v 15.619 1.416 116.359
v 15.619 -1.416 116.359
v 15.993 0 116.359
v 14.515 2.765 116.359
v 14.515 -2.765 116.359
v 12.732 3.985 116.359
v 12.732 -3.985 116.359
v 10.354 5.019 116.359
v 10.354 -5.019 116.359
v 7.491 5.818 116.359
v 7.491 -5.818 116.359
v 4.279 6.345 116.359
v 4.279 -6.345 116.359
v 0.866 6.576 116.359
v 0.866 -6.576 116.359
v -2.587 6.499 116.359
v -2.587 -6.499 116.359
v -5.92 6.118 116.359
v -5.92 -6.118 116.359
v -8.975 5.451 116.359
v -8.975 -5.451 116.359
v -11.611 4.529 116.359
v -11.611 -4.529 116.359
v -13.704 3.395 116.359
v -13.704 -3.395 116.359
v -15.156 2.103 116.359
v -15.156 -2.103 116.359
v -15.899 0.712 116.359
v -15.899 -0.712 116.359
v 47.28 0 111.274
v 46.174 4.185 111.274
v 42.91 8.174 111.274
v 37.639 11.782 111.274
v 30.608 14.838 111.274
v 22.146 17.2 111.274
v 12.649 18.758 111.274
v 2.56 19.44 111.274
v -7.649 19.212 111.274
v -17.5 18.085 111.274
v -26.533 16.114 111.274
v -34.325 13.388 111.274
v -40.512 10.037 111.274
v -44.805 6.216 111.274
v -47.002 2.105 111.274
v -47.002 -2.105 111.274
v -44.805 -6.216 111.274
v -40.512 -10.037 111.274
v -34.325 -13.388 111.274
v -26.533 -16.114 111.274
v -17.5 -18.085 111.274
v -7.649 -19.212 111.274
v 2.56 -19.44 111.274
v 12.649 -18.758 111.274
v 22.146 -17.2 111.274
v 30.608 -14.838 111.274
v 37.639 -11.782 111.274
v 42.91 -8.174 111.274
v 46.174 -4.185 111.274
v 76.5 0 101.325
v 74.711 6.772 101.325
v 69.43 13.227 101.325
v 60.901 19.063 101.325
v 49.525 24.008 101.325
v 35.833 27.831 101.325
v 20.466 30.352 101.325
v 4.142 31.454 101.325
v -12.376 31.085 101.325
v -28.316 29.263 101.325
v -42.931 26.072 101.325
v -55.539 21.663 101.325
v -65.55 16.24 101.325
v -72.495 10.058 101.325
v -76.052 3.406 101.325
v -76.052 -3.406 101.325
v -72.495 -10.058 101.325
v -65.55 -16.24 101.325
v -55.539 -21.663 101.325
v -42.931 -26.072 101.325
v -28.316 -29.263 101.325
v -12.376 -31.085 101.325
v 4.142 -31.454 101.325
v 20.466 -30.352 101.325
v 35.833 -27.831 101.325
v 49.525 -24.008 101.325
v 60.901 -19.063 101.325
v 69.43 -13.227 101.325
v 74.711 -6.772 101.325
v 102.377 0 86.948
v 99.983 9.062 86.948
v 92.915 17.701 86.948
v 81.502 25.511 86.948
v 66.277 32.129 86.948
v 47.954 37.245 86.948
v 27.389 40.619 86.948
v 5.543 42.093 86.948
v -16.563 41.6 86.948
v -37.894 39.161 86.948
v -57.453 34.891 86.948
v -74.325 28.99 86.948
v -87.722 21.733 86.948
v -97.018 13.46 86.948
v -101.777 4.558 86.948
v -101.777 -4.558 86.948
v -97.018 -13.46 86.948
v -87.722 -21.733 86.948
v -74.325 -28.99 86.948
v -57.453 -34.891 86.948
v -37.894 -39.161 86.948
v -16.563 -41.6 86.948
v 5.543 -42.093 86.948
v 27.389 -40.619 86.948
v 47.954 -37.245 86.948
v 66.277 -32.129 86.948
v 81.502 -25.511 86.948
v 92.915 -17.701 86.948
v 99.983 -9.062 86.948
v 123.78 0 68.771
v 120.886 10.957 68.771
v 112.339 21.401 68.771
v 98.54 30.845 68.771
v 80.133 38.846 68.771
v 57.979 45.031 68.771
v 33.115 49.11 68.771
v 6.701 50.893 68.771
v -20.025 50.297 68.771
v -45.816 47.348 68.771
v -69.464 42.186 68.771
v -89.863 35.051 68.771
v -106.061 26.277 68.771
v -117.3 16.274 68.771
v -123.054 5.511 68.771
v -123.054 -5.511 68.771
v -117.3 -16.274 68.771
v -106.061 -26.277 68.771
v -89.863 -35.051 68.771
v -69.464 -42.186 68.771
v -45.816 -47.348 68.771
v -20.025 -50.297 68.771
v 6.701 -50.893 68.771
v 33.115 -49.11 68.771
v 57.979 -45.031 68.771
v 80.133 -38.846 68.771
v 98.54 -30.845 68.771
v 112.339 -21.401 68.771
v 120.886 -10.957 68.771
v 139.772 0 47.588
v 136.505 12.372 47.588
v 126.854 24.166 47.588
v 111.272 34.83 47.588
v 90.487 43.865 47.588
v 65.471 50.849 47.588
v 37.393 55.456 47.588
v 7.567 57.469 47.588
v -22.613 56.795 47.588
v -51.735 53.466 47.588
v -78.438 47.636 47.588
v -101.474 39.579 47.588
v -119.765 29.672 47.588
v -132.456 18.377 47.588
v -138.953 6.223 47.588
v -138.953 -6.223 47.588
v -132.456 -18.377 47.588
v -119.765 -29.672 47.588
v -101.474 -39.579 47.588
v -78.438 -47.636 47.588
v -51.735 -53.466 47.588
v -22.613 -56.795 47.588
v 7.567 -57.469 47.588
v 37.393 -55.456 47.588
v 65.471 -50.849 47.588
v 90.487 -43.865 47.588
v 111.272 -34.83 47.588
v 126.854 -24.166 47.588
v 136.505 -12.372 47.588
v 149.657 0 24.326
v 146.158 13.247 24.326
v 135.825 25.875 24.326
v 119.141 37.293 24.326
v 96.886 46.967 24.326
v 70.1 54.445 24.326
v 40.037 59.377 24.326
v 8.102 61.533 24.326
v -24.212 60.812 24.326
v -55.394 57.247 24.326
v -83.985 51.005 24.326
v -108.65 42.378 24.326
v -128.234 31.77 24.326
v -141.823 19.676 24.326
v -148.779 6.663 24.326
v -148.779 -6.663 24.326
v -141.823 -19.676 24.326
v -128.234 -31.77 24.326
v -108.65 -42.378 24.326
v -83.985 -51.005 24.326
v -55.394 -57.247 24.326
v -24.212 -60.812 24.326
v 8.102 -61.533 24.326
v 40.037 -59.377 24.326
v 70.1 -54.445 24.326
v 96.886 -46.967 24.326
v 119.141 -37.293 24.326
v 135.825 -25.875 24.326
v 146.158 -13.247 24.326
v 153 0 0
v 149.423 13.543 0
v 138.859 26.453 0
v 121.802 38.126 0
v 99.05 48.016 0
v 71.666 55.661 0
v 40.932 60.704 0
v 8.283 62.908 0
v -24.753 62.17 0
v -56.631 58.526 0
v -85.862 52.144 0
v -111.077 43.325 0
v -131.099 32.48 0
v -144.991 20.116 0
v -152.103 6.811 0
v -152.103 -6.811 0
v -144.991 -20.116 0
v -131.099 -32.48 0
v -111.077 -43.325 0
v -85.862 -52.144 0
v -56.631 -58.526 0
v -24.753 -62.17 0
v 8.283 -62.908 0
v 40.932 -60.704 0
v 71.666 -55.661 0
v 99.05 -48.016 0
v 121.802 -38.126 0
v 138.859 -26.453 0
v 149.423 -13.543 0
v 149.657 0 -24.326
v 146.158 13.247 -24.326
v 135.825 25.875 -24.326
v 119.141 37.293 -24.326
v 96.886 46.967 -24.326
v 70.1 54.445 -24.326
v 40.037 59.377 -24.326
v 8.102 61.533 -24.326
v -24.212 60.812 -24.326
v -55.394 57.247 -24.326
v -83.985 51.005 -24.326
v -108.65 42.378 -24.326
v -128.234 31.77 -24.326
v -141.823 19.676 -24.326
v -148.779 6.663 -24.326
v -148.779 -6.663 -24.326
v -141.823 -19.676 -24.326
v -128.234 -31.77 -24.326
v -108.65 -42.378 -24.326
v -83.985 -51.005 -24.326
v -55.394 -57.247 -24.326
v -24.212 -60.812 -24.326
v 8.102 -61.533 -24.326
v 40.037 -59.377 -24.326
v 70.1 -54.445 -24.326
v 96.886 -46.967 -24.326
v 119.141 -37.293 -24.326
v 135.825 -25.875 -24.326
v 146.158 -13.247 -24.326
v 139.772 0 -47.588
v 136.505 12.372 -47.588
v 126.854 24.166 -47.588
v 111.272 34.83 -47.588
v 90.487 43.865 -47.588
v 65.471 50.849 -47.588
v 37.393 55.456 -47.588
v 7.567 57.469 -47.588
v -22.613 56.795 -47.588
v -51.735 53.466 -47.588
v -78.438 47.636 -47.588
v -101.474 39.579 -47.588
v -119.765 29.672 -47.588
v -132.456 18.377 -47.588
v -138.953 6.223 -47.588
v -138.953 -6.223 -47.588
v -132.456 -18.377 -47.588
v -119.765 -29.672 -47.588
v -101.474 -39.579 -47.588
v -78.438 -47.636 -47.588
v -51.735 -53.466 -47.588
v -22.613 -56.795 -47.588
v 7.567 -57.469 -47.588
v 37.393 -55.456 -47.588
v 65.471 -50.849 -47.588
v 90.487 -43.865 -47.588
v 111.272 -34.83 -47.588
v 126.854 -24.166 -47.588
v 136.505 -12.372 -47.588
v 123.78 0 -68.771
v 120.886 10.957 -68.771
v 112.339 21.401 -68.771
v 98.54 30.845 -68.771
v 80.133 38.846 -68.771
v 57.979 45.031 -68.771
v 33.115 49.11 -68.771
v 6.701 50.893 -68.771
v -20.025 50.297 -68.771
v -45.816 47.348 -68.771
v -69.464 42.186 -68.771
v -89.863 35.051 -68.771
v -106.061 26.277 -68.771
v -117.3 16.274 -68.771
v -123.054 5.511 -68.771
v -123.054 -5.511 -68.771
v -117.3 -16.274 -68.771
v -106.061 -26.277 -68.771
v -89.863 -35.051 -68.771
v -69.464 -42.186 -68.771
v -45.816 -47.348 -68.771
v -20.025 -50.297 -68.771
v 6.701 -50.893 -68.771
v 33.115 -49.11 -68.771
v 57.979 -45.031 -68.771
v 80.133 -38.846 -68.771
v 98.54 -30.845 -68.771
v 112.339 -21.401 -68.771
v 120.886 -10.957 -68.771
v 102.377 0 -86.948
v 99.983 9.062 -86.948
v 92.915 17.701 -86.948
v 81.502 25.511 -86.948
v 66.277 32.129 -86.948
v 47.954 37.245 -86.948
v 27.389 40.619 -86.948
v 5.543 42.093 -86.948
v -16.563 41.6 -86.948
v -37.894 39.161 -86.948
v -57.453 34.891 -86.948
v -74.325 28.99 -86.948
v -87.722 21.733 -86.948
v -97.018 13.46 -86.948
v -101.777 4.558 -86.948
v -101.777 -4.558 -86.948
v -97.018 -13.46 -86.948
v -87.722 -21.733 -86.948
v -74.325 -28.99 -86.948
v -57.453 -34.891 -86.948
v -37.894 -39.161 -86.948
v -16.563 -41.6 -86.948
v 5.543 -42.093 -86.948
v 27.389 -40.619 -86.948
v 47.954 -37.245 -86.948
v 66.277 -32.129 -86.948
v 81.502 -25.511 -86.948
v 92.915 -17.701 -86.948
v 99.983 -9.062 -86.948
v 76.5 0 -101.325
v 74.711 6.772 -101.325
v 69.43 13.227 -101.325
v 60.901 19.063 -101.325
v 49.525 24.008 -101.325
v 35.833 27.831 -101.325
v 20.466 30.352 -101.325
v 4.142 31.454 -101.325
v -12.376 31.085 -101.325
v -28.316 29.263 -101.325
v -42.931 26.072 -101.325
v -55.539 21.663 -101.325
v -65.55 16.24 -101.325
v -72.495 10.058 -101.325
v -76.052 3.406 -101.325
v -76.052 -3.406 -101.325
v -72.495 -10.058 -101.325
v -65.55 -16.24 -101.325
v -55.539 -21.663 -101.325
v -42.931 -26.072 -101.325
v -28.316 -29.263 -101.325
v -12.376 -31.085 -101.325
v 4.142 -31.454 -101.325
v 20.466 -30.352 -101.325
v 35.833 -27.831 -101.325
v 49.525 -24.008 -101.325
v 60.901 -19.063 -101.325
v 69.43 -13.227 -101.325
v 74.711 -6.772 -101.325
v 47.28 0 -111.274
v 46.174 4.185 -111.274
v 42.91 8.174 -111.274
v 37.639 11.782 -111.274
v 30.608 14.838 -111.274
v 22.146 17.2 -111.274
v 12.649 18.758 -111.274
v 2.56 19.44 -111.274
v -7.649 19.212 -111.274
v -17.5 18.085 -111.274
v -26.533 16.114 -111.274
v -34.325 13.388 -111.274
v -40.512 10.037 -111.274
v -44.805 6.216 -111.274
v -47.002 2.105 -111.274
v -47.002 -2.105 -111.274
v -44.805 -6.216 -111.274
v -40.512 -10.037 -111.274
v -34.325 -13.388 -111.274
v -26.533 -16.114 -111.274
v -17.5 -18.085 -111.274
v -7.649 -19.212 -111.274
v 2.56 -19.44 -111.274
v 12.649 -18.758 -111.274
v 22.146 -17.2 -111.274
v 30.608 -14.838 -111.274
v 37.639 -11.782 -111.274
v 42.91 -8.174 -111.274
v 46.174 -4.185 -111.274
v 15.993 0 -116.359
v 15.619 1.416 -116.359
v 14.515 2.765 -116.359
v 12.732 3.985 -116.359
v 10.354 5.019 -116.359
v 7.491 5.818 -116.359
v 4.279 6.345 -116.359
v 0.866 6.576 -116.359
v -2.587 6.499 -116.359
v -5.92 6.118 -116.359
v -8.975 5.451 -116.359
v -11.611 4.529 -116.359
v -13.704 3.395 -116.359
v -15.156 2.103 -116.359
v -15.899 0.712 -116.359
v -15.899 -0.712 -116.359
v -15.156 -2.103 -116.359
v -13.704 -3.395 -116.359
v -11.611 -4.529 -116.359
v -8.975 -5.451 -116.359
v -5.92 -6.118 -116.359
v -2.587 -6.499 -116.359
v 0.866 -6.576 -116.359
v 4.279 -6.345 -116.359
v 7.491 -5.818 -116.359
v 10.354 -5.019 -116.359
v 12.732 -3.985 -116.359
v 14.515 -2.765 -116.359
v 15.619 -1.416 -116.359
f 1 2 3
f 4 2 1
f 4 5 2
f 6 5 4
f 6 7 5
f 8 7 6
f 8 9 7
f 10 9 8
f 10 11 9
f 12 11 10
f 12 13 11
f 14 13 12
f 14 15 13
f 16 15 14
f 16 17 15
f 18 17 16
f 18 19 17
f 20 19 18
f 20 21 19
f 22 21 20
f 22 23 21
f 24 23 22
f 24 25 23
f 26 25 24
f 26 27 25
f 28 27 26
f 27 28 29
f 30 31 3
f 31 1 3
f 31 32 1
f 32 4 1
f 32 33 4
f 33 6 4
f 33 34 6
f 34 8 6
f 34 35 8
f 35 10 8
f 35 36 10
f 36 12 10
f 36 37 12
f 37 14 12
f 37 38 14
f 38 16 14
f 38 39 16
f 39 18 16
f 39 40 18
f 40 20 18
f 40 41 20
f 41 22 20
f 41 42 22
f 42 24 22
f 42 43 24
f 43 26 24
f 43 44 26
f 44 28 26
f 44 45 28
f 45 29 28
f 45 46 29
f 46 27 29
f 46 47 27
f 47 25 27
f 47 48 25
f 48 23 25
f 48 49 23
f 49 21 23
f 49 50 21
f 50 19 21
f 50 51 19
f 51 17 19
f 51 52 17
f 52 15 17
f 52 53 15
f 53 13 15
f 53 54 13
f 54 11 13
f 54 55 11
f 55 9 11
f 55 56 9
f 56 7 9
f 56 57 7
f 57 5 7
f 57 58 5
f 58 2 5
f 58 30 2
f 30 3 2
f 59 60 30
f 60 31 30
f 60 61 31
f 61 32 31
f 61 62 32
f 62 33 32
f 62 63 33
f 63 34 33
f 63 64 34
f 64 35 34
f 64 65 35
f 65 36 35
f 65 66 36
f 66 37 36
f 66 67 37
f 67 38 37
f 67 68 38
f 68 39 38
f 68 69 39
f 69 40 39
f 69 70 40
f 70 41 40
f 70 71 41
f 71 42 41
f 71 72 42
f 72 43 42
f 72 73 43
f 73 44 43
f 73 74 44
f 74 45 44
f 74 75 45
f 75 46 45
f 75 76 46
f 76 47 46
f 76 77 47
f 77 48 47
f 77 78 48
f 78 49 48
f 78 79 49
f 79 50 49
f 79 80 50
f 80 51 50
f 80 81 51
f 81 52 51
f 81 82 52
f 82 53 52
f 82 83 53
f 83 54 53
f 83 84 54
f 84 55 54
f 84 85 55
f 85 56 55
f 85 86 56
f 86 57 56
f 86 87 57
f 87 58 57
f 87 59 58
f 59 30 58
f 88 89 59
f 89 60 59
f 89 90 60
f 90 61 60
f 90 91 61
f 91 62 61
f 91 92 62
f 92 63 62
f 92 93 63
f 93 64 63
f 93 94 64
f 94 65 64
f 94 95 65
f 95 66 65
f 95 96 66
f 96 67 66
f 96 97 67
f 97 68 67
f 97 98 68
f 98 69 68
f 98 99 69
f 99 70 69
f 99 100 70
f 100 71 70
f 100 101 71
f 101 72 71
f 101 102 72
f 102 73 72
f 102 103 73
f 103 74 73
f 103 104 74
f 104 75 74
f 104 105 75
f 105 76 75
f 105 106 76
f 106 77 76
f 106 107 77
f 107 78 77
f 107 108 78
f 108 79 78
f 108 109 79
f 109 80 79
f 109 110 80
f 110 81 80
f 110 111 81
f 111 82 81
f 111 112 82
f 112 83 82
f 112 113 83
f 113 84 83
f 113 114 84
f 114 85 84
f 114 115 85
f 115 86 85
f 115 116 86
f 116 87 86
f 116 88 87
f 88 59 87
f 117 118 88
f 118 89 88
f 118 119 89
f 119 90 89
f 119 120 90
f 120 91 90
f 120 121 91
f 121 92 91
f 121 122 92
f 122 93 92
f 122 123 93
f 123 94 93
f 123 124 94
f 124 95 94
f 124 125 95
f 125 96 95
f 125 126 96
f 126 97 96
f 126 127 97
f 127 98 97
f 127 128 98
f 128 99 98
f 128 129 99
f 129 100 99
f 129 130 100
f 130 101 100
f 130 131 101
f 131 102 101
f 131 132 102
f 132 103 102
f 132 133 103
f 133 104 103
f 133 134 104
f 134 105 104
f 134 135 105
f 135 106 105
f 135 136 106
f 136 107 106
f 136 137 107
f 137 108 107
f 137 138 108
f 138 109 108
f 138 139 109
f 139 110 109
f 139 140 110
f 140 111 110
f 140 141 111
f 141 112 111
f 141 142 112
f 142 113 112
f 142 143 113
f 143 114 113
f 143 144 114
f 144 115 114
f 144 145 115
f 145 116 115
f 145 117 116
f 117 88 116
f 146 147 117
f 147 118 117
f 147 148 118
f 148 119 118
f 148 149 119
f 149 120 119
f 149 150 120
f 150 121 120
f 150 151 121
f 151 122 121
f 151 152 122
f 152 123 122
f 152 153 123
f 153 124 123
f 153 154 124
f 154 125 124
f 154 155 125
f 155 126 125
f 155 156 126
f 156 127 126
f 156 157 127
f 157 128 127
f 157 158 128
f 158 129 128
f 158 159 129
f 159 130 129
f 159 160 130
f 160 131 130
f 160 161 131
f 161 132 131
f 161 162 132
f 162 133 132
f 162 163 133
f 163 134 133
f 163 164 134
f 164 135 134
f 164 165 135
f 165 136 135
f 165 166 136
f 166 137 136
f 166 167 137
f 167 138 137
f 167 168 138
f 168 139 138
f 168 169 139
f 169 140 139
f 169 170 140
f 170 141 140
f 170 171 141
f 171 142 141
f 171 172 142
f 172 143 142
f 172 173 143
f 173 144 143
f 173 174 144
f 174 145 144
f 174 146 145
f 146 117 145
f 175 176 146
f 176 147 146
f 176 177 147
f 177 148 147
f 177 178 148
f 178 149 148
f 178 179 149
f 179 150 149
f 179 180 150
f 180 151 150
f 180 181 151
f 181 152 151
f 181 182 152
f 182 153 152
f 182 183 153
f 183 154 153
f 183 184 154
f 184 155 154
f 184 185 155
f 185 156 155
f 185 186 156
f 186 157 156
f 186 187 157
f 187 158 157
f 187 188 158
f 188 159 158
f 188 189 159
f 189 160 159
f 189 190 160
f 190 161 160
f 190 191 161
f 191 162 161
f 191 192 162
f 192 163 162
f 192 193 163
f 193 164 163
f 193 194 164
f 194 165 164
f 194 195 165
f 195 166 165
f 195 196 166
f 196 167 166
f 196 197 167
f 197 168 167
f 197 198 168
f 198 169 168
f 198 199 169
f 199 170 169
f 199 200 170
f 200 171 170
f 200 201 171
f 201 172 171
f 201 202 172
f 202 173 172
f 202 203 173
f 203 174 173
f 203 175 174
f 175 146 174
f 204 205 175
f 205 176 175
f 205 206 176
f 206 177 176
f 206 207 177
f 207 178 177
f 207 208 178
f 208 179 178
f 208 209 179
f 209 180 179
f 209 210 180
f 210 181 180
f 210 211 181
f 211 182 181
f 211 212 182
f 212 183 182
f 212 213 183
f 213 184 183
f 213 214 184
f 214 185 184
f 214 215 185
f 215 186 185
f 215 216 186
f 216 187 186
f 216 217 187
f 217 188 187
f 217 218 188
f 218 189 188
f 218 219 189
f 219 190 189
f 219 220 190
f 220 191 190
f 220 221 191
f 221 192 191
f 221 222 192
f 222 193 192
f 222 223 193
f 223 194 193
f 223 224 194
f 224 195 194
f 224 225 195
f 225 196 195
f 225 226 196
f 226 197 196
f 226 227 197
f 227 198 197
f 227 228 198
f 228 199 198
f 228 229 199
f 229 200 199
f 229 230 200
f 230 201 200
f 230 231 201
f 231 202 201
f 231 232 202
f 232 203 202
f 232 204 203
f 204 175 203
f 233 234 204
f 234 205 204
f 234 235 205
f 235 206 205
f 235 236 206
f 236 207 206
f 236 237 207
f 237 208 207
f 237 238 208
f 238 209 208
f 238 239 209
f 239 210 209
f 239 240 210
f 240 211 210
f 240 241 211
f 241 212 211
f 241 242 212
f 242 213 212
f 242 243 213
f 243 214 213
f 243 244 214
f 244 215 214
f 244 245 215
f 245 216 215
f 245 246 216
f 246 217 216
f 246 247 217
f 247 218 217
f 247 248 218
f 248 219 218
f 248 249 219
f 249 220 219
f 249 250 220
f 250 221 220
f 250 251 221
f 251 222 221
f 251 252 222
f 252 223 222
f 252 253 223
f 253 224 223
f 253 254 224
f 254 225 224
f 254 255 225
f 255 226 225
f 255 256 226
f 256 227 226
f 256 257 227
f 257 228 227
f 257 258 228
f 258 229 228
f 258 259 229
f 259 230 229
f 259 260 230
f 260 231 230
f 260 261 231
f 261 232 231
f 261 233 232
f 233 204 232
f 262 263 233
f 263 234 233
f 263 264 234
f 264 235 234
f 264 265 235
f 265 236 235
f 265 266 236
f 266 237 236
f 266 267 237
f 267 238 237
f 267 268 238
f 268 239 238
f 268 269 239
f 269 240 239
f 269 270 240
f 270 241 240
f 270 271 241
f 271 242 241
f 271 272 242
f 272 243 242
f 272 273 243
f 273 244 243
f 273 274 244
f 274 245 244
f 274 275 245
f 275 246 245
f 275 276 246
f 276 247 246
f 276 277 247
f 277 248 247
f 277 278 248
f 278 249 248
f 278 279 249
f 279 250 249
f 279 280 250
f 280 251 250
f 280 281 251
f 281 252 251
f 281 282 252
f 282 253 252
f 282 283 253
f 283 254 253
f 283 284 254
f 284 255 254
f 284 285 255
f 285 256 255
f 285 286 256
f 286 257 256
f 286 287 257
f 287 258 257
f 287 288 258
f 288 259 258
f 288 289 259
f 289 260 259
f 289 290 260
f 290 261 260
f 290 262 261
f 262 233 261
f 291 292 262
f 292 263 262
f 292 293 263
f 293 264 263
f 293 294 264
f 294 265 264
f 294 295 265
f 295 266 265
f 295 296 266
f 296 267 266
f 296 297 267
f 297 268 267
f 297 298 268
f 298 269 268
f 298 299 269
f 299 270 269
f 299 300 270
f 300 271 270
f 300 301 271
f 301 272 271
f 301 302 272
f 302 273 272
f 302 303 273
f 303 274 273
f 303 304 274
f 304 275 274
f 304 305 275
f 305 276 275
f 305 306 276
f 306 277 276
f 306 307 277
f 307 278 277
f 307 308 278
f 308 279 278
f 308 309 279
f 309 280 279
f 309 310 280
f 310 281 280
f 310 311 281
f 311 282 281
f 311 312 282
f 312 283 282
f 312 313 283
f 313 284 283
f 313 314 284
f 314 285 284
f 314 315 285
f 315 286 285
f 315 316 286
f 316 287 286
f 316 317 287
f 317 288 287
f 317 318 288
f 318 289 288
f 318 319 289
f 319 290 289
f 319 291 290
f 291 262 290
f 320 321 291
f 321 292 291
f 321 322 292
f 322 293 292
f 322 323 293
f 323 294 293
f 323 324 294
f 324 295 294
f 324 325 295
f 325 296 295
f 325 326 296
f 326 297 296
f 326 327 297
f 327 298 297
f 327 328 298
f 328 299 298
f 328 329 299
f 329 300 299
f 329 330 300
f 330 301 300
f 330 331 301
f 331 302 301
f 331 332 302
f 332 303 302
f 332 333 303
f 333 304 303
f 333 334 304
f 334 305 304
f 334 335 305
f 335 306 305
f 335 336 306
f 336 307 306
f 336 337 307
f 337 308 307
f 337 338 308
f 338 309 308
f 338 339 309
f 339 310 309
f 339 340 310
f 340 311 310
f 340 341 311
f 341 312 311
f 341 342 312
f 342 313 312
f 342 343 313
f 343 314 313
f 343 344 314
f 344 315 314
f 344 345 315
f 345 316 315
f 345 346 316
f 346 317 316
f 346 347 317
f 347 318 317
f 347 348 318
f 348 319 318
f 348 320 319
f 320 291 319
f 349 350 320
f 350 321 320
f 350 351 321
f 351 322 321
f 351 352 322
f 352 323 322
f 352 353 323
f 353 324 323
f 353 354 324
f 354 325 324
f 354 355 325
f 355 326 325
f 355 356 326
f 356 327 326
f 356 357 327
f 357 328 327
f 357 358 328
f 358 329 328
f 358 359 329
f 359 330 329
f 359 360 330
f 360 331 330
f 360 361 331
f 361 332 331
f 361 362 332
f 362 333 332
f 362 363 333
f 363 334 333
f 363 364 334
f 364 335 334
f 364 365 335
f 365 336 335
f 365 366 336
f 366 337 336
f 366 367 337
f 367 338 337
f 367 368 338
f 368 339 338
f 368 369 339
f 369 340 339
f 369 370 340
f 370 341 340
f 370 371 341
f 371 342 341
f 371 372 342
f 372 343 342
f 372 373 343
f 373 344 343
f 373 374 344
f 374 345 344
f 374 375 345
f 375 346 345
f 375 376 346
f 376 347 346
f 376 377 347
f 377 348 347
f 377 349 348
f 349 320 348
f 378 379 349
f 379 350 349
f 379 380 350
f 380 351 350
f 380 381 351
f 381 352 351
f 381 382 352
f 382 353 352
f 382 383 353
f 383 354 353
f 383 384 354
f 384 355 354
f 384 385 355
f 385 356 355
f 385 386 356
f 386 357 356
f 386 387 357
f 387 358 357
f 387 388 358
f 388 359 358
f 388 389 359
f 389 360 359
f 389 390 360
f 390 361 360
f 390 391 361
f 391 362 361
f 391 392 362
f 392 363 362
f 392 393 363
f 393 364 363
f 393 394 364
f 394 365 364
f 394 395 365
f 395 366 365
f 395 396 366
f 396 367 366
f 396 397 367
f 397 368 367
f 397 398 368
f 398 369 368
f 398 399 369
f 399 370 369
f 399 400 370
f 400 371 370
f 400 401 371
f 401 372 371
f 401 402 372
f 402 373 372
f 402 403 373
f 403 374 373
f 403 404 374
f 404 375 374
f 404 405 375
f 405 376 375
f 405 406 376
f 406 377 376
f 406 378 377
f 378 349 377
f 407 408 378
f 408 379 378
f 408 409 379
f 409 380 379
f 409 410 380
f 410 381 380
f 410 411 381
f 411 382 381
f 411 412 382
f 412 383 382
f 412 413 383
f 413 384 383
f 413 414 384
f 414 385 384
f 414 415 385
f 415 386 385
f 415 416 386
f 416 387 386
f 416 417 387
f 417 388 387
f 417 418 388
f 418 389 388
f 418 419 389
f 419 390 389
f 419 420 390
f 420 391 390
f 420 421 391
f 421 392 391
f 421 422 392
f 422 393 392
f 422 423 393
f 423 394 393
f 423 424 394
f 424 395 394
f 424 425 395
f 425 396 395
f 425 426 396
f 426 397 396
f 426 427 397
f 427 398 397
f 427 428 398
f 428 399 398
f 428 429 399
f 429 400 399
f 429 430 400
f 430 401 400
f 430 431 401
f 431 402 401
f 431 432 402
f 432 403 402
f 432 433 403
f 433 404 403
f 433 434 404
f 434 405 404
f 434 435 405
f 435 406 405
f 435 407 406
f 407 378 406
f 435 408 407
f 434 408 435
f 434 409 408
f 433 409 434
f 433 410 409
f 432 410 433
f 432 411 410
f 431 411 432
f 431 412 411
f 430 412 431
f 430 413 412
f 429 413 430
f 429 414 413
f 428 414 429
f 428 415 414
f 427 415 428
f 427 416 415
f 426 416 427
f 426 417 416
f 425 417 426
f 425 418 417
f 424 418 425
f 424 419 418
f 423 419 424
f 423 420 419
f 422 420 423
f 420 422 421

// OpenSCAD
// Generated by SolidPython 1.0.1 on 2020-07-29 00:46:52


scale(v = [17, 7, 13]) {
	sphere(r = 9);
}
/***********************************************
*********      SolidPython code:      **********
************************************************
 
# import packages: SolidPython
from solid import *
from solid.utils import *
from itertools import chain, combinations, permutations


class Resize:

    def __init__(self, scad_file):
        self.scad_file = scad_file
        #self.scad_file = import_scad(scad_file)
        # cone/cylinder param:
        self.r1 = 0
        self.r2 = 0
        self.h = 0
        # rectangular prism param:
        self.w = 0
        self.l = 0
        # ellipse param:
        self.r = 0

    # import OpenScad code (file name corresponds to shape)


    # classify shape + parameters
    def assign(self, param1, param2, param3):
        if self.scad_file == 'cone.scad':
            self.r1 = param1
            self.r2 = param2
            self.h = param3
        elif self.scad_file == 'cylinder.scad':
            self.r1 = param1
            self.r2 = param2
            self.h = param3
        elif self.scad_file == 'rectangularPrism.scad':
            self.h = param1
            self.l = param2
            self.w = param3
        else:
            self.r = param1
            self.h = param2

    # resize parameters
    def iterate(self):
        x = range(3, 20, 2)
        i = 1
        if self.scad_file == 'cone.scad':
            tempList = list(permutations(x, 2))
            for temp in tempList:
                param1 = temp[0]
                param2 = temp[1]
                filepath = 'produced_scad_files/' + 'cone' + str(param1) + '_' + str(param2) + '_' + '.scad'
                scad_render_to_file(cylinder(h=param1, r1=param2, r2=0), filepath)

        elif self.scad_file == 'cylinder.scad':
            tempList = list(permutations(x, 3))
            for temp in tempList:
                param1 = temp[0]
                param2 = temp[1]
                filepath = 'produced_scad_files/' + 'cylinder' + str(param1) + '_' + str(param2) + '_' + '.scad'
                scad_render_to_file(cylinder(h=param1, r1=param2, r2=param2), filepath)

        elif self.scad_file == 'rectangularPrism.scad':
            tempList = list(permutations(x, 3))
            for temp in tempList:
                param1 = temp[0]
                param2 = temp[1]
                param3 = temp[2]
                filepath = 'produced_scad_files/' + 'rectangularPrism' + str(param1) + '_' + str(param2) + '_' + str(
                    param3) + '.scad'
                scad_render_to_file(cube(size=(param1, param2, param3)), filepath)

        elif self.scad_file == 'ellipse.scad':
            tempList = list(permutations(x, 4))
            for temp in tempList:
                param1 = temp[0]
                param2 = temp[1]
                param3 = temp[2]
                param4 = temp[3]
                filepath = 'produced_scad_files/' + 'ellipse' + str(param1) + '_' + str(param2) + '_' + str(param3) + '_' + str(param4) + '.scad'
                scad_render_to_file(scale([param1, param2, param3])(sphere(r=param4)), filepath)

    def render_to_scadfile(self):
        scad_render_to_file(scad, 'example.scad') 
 
************************************************/
